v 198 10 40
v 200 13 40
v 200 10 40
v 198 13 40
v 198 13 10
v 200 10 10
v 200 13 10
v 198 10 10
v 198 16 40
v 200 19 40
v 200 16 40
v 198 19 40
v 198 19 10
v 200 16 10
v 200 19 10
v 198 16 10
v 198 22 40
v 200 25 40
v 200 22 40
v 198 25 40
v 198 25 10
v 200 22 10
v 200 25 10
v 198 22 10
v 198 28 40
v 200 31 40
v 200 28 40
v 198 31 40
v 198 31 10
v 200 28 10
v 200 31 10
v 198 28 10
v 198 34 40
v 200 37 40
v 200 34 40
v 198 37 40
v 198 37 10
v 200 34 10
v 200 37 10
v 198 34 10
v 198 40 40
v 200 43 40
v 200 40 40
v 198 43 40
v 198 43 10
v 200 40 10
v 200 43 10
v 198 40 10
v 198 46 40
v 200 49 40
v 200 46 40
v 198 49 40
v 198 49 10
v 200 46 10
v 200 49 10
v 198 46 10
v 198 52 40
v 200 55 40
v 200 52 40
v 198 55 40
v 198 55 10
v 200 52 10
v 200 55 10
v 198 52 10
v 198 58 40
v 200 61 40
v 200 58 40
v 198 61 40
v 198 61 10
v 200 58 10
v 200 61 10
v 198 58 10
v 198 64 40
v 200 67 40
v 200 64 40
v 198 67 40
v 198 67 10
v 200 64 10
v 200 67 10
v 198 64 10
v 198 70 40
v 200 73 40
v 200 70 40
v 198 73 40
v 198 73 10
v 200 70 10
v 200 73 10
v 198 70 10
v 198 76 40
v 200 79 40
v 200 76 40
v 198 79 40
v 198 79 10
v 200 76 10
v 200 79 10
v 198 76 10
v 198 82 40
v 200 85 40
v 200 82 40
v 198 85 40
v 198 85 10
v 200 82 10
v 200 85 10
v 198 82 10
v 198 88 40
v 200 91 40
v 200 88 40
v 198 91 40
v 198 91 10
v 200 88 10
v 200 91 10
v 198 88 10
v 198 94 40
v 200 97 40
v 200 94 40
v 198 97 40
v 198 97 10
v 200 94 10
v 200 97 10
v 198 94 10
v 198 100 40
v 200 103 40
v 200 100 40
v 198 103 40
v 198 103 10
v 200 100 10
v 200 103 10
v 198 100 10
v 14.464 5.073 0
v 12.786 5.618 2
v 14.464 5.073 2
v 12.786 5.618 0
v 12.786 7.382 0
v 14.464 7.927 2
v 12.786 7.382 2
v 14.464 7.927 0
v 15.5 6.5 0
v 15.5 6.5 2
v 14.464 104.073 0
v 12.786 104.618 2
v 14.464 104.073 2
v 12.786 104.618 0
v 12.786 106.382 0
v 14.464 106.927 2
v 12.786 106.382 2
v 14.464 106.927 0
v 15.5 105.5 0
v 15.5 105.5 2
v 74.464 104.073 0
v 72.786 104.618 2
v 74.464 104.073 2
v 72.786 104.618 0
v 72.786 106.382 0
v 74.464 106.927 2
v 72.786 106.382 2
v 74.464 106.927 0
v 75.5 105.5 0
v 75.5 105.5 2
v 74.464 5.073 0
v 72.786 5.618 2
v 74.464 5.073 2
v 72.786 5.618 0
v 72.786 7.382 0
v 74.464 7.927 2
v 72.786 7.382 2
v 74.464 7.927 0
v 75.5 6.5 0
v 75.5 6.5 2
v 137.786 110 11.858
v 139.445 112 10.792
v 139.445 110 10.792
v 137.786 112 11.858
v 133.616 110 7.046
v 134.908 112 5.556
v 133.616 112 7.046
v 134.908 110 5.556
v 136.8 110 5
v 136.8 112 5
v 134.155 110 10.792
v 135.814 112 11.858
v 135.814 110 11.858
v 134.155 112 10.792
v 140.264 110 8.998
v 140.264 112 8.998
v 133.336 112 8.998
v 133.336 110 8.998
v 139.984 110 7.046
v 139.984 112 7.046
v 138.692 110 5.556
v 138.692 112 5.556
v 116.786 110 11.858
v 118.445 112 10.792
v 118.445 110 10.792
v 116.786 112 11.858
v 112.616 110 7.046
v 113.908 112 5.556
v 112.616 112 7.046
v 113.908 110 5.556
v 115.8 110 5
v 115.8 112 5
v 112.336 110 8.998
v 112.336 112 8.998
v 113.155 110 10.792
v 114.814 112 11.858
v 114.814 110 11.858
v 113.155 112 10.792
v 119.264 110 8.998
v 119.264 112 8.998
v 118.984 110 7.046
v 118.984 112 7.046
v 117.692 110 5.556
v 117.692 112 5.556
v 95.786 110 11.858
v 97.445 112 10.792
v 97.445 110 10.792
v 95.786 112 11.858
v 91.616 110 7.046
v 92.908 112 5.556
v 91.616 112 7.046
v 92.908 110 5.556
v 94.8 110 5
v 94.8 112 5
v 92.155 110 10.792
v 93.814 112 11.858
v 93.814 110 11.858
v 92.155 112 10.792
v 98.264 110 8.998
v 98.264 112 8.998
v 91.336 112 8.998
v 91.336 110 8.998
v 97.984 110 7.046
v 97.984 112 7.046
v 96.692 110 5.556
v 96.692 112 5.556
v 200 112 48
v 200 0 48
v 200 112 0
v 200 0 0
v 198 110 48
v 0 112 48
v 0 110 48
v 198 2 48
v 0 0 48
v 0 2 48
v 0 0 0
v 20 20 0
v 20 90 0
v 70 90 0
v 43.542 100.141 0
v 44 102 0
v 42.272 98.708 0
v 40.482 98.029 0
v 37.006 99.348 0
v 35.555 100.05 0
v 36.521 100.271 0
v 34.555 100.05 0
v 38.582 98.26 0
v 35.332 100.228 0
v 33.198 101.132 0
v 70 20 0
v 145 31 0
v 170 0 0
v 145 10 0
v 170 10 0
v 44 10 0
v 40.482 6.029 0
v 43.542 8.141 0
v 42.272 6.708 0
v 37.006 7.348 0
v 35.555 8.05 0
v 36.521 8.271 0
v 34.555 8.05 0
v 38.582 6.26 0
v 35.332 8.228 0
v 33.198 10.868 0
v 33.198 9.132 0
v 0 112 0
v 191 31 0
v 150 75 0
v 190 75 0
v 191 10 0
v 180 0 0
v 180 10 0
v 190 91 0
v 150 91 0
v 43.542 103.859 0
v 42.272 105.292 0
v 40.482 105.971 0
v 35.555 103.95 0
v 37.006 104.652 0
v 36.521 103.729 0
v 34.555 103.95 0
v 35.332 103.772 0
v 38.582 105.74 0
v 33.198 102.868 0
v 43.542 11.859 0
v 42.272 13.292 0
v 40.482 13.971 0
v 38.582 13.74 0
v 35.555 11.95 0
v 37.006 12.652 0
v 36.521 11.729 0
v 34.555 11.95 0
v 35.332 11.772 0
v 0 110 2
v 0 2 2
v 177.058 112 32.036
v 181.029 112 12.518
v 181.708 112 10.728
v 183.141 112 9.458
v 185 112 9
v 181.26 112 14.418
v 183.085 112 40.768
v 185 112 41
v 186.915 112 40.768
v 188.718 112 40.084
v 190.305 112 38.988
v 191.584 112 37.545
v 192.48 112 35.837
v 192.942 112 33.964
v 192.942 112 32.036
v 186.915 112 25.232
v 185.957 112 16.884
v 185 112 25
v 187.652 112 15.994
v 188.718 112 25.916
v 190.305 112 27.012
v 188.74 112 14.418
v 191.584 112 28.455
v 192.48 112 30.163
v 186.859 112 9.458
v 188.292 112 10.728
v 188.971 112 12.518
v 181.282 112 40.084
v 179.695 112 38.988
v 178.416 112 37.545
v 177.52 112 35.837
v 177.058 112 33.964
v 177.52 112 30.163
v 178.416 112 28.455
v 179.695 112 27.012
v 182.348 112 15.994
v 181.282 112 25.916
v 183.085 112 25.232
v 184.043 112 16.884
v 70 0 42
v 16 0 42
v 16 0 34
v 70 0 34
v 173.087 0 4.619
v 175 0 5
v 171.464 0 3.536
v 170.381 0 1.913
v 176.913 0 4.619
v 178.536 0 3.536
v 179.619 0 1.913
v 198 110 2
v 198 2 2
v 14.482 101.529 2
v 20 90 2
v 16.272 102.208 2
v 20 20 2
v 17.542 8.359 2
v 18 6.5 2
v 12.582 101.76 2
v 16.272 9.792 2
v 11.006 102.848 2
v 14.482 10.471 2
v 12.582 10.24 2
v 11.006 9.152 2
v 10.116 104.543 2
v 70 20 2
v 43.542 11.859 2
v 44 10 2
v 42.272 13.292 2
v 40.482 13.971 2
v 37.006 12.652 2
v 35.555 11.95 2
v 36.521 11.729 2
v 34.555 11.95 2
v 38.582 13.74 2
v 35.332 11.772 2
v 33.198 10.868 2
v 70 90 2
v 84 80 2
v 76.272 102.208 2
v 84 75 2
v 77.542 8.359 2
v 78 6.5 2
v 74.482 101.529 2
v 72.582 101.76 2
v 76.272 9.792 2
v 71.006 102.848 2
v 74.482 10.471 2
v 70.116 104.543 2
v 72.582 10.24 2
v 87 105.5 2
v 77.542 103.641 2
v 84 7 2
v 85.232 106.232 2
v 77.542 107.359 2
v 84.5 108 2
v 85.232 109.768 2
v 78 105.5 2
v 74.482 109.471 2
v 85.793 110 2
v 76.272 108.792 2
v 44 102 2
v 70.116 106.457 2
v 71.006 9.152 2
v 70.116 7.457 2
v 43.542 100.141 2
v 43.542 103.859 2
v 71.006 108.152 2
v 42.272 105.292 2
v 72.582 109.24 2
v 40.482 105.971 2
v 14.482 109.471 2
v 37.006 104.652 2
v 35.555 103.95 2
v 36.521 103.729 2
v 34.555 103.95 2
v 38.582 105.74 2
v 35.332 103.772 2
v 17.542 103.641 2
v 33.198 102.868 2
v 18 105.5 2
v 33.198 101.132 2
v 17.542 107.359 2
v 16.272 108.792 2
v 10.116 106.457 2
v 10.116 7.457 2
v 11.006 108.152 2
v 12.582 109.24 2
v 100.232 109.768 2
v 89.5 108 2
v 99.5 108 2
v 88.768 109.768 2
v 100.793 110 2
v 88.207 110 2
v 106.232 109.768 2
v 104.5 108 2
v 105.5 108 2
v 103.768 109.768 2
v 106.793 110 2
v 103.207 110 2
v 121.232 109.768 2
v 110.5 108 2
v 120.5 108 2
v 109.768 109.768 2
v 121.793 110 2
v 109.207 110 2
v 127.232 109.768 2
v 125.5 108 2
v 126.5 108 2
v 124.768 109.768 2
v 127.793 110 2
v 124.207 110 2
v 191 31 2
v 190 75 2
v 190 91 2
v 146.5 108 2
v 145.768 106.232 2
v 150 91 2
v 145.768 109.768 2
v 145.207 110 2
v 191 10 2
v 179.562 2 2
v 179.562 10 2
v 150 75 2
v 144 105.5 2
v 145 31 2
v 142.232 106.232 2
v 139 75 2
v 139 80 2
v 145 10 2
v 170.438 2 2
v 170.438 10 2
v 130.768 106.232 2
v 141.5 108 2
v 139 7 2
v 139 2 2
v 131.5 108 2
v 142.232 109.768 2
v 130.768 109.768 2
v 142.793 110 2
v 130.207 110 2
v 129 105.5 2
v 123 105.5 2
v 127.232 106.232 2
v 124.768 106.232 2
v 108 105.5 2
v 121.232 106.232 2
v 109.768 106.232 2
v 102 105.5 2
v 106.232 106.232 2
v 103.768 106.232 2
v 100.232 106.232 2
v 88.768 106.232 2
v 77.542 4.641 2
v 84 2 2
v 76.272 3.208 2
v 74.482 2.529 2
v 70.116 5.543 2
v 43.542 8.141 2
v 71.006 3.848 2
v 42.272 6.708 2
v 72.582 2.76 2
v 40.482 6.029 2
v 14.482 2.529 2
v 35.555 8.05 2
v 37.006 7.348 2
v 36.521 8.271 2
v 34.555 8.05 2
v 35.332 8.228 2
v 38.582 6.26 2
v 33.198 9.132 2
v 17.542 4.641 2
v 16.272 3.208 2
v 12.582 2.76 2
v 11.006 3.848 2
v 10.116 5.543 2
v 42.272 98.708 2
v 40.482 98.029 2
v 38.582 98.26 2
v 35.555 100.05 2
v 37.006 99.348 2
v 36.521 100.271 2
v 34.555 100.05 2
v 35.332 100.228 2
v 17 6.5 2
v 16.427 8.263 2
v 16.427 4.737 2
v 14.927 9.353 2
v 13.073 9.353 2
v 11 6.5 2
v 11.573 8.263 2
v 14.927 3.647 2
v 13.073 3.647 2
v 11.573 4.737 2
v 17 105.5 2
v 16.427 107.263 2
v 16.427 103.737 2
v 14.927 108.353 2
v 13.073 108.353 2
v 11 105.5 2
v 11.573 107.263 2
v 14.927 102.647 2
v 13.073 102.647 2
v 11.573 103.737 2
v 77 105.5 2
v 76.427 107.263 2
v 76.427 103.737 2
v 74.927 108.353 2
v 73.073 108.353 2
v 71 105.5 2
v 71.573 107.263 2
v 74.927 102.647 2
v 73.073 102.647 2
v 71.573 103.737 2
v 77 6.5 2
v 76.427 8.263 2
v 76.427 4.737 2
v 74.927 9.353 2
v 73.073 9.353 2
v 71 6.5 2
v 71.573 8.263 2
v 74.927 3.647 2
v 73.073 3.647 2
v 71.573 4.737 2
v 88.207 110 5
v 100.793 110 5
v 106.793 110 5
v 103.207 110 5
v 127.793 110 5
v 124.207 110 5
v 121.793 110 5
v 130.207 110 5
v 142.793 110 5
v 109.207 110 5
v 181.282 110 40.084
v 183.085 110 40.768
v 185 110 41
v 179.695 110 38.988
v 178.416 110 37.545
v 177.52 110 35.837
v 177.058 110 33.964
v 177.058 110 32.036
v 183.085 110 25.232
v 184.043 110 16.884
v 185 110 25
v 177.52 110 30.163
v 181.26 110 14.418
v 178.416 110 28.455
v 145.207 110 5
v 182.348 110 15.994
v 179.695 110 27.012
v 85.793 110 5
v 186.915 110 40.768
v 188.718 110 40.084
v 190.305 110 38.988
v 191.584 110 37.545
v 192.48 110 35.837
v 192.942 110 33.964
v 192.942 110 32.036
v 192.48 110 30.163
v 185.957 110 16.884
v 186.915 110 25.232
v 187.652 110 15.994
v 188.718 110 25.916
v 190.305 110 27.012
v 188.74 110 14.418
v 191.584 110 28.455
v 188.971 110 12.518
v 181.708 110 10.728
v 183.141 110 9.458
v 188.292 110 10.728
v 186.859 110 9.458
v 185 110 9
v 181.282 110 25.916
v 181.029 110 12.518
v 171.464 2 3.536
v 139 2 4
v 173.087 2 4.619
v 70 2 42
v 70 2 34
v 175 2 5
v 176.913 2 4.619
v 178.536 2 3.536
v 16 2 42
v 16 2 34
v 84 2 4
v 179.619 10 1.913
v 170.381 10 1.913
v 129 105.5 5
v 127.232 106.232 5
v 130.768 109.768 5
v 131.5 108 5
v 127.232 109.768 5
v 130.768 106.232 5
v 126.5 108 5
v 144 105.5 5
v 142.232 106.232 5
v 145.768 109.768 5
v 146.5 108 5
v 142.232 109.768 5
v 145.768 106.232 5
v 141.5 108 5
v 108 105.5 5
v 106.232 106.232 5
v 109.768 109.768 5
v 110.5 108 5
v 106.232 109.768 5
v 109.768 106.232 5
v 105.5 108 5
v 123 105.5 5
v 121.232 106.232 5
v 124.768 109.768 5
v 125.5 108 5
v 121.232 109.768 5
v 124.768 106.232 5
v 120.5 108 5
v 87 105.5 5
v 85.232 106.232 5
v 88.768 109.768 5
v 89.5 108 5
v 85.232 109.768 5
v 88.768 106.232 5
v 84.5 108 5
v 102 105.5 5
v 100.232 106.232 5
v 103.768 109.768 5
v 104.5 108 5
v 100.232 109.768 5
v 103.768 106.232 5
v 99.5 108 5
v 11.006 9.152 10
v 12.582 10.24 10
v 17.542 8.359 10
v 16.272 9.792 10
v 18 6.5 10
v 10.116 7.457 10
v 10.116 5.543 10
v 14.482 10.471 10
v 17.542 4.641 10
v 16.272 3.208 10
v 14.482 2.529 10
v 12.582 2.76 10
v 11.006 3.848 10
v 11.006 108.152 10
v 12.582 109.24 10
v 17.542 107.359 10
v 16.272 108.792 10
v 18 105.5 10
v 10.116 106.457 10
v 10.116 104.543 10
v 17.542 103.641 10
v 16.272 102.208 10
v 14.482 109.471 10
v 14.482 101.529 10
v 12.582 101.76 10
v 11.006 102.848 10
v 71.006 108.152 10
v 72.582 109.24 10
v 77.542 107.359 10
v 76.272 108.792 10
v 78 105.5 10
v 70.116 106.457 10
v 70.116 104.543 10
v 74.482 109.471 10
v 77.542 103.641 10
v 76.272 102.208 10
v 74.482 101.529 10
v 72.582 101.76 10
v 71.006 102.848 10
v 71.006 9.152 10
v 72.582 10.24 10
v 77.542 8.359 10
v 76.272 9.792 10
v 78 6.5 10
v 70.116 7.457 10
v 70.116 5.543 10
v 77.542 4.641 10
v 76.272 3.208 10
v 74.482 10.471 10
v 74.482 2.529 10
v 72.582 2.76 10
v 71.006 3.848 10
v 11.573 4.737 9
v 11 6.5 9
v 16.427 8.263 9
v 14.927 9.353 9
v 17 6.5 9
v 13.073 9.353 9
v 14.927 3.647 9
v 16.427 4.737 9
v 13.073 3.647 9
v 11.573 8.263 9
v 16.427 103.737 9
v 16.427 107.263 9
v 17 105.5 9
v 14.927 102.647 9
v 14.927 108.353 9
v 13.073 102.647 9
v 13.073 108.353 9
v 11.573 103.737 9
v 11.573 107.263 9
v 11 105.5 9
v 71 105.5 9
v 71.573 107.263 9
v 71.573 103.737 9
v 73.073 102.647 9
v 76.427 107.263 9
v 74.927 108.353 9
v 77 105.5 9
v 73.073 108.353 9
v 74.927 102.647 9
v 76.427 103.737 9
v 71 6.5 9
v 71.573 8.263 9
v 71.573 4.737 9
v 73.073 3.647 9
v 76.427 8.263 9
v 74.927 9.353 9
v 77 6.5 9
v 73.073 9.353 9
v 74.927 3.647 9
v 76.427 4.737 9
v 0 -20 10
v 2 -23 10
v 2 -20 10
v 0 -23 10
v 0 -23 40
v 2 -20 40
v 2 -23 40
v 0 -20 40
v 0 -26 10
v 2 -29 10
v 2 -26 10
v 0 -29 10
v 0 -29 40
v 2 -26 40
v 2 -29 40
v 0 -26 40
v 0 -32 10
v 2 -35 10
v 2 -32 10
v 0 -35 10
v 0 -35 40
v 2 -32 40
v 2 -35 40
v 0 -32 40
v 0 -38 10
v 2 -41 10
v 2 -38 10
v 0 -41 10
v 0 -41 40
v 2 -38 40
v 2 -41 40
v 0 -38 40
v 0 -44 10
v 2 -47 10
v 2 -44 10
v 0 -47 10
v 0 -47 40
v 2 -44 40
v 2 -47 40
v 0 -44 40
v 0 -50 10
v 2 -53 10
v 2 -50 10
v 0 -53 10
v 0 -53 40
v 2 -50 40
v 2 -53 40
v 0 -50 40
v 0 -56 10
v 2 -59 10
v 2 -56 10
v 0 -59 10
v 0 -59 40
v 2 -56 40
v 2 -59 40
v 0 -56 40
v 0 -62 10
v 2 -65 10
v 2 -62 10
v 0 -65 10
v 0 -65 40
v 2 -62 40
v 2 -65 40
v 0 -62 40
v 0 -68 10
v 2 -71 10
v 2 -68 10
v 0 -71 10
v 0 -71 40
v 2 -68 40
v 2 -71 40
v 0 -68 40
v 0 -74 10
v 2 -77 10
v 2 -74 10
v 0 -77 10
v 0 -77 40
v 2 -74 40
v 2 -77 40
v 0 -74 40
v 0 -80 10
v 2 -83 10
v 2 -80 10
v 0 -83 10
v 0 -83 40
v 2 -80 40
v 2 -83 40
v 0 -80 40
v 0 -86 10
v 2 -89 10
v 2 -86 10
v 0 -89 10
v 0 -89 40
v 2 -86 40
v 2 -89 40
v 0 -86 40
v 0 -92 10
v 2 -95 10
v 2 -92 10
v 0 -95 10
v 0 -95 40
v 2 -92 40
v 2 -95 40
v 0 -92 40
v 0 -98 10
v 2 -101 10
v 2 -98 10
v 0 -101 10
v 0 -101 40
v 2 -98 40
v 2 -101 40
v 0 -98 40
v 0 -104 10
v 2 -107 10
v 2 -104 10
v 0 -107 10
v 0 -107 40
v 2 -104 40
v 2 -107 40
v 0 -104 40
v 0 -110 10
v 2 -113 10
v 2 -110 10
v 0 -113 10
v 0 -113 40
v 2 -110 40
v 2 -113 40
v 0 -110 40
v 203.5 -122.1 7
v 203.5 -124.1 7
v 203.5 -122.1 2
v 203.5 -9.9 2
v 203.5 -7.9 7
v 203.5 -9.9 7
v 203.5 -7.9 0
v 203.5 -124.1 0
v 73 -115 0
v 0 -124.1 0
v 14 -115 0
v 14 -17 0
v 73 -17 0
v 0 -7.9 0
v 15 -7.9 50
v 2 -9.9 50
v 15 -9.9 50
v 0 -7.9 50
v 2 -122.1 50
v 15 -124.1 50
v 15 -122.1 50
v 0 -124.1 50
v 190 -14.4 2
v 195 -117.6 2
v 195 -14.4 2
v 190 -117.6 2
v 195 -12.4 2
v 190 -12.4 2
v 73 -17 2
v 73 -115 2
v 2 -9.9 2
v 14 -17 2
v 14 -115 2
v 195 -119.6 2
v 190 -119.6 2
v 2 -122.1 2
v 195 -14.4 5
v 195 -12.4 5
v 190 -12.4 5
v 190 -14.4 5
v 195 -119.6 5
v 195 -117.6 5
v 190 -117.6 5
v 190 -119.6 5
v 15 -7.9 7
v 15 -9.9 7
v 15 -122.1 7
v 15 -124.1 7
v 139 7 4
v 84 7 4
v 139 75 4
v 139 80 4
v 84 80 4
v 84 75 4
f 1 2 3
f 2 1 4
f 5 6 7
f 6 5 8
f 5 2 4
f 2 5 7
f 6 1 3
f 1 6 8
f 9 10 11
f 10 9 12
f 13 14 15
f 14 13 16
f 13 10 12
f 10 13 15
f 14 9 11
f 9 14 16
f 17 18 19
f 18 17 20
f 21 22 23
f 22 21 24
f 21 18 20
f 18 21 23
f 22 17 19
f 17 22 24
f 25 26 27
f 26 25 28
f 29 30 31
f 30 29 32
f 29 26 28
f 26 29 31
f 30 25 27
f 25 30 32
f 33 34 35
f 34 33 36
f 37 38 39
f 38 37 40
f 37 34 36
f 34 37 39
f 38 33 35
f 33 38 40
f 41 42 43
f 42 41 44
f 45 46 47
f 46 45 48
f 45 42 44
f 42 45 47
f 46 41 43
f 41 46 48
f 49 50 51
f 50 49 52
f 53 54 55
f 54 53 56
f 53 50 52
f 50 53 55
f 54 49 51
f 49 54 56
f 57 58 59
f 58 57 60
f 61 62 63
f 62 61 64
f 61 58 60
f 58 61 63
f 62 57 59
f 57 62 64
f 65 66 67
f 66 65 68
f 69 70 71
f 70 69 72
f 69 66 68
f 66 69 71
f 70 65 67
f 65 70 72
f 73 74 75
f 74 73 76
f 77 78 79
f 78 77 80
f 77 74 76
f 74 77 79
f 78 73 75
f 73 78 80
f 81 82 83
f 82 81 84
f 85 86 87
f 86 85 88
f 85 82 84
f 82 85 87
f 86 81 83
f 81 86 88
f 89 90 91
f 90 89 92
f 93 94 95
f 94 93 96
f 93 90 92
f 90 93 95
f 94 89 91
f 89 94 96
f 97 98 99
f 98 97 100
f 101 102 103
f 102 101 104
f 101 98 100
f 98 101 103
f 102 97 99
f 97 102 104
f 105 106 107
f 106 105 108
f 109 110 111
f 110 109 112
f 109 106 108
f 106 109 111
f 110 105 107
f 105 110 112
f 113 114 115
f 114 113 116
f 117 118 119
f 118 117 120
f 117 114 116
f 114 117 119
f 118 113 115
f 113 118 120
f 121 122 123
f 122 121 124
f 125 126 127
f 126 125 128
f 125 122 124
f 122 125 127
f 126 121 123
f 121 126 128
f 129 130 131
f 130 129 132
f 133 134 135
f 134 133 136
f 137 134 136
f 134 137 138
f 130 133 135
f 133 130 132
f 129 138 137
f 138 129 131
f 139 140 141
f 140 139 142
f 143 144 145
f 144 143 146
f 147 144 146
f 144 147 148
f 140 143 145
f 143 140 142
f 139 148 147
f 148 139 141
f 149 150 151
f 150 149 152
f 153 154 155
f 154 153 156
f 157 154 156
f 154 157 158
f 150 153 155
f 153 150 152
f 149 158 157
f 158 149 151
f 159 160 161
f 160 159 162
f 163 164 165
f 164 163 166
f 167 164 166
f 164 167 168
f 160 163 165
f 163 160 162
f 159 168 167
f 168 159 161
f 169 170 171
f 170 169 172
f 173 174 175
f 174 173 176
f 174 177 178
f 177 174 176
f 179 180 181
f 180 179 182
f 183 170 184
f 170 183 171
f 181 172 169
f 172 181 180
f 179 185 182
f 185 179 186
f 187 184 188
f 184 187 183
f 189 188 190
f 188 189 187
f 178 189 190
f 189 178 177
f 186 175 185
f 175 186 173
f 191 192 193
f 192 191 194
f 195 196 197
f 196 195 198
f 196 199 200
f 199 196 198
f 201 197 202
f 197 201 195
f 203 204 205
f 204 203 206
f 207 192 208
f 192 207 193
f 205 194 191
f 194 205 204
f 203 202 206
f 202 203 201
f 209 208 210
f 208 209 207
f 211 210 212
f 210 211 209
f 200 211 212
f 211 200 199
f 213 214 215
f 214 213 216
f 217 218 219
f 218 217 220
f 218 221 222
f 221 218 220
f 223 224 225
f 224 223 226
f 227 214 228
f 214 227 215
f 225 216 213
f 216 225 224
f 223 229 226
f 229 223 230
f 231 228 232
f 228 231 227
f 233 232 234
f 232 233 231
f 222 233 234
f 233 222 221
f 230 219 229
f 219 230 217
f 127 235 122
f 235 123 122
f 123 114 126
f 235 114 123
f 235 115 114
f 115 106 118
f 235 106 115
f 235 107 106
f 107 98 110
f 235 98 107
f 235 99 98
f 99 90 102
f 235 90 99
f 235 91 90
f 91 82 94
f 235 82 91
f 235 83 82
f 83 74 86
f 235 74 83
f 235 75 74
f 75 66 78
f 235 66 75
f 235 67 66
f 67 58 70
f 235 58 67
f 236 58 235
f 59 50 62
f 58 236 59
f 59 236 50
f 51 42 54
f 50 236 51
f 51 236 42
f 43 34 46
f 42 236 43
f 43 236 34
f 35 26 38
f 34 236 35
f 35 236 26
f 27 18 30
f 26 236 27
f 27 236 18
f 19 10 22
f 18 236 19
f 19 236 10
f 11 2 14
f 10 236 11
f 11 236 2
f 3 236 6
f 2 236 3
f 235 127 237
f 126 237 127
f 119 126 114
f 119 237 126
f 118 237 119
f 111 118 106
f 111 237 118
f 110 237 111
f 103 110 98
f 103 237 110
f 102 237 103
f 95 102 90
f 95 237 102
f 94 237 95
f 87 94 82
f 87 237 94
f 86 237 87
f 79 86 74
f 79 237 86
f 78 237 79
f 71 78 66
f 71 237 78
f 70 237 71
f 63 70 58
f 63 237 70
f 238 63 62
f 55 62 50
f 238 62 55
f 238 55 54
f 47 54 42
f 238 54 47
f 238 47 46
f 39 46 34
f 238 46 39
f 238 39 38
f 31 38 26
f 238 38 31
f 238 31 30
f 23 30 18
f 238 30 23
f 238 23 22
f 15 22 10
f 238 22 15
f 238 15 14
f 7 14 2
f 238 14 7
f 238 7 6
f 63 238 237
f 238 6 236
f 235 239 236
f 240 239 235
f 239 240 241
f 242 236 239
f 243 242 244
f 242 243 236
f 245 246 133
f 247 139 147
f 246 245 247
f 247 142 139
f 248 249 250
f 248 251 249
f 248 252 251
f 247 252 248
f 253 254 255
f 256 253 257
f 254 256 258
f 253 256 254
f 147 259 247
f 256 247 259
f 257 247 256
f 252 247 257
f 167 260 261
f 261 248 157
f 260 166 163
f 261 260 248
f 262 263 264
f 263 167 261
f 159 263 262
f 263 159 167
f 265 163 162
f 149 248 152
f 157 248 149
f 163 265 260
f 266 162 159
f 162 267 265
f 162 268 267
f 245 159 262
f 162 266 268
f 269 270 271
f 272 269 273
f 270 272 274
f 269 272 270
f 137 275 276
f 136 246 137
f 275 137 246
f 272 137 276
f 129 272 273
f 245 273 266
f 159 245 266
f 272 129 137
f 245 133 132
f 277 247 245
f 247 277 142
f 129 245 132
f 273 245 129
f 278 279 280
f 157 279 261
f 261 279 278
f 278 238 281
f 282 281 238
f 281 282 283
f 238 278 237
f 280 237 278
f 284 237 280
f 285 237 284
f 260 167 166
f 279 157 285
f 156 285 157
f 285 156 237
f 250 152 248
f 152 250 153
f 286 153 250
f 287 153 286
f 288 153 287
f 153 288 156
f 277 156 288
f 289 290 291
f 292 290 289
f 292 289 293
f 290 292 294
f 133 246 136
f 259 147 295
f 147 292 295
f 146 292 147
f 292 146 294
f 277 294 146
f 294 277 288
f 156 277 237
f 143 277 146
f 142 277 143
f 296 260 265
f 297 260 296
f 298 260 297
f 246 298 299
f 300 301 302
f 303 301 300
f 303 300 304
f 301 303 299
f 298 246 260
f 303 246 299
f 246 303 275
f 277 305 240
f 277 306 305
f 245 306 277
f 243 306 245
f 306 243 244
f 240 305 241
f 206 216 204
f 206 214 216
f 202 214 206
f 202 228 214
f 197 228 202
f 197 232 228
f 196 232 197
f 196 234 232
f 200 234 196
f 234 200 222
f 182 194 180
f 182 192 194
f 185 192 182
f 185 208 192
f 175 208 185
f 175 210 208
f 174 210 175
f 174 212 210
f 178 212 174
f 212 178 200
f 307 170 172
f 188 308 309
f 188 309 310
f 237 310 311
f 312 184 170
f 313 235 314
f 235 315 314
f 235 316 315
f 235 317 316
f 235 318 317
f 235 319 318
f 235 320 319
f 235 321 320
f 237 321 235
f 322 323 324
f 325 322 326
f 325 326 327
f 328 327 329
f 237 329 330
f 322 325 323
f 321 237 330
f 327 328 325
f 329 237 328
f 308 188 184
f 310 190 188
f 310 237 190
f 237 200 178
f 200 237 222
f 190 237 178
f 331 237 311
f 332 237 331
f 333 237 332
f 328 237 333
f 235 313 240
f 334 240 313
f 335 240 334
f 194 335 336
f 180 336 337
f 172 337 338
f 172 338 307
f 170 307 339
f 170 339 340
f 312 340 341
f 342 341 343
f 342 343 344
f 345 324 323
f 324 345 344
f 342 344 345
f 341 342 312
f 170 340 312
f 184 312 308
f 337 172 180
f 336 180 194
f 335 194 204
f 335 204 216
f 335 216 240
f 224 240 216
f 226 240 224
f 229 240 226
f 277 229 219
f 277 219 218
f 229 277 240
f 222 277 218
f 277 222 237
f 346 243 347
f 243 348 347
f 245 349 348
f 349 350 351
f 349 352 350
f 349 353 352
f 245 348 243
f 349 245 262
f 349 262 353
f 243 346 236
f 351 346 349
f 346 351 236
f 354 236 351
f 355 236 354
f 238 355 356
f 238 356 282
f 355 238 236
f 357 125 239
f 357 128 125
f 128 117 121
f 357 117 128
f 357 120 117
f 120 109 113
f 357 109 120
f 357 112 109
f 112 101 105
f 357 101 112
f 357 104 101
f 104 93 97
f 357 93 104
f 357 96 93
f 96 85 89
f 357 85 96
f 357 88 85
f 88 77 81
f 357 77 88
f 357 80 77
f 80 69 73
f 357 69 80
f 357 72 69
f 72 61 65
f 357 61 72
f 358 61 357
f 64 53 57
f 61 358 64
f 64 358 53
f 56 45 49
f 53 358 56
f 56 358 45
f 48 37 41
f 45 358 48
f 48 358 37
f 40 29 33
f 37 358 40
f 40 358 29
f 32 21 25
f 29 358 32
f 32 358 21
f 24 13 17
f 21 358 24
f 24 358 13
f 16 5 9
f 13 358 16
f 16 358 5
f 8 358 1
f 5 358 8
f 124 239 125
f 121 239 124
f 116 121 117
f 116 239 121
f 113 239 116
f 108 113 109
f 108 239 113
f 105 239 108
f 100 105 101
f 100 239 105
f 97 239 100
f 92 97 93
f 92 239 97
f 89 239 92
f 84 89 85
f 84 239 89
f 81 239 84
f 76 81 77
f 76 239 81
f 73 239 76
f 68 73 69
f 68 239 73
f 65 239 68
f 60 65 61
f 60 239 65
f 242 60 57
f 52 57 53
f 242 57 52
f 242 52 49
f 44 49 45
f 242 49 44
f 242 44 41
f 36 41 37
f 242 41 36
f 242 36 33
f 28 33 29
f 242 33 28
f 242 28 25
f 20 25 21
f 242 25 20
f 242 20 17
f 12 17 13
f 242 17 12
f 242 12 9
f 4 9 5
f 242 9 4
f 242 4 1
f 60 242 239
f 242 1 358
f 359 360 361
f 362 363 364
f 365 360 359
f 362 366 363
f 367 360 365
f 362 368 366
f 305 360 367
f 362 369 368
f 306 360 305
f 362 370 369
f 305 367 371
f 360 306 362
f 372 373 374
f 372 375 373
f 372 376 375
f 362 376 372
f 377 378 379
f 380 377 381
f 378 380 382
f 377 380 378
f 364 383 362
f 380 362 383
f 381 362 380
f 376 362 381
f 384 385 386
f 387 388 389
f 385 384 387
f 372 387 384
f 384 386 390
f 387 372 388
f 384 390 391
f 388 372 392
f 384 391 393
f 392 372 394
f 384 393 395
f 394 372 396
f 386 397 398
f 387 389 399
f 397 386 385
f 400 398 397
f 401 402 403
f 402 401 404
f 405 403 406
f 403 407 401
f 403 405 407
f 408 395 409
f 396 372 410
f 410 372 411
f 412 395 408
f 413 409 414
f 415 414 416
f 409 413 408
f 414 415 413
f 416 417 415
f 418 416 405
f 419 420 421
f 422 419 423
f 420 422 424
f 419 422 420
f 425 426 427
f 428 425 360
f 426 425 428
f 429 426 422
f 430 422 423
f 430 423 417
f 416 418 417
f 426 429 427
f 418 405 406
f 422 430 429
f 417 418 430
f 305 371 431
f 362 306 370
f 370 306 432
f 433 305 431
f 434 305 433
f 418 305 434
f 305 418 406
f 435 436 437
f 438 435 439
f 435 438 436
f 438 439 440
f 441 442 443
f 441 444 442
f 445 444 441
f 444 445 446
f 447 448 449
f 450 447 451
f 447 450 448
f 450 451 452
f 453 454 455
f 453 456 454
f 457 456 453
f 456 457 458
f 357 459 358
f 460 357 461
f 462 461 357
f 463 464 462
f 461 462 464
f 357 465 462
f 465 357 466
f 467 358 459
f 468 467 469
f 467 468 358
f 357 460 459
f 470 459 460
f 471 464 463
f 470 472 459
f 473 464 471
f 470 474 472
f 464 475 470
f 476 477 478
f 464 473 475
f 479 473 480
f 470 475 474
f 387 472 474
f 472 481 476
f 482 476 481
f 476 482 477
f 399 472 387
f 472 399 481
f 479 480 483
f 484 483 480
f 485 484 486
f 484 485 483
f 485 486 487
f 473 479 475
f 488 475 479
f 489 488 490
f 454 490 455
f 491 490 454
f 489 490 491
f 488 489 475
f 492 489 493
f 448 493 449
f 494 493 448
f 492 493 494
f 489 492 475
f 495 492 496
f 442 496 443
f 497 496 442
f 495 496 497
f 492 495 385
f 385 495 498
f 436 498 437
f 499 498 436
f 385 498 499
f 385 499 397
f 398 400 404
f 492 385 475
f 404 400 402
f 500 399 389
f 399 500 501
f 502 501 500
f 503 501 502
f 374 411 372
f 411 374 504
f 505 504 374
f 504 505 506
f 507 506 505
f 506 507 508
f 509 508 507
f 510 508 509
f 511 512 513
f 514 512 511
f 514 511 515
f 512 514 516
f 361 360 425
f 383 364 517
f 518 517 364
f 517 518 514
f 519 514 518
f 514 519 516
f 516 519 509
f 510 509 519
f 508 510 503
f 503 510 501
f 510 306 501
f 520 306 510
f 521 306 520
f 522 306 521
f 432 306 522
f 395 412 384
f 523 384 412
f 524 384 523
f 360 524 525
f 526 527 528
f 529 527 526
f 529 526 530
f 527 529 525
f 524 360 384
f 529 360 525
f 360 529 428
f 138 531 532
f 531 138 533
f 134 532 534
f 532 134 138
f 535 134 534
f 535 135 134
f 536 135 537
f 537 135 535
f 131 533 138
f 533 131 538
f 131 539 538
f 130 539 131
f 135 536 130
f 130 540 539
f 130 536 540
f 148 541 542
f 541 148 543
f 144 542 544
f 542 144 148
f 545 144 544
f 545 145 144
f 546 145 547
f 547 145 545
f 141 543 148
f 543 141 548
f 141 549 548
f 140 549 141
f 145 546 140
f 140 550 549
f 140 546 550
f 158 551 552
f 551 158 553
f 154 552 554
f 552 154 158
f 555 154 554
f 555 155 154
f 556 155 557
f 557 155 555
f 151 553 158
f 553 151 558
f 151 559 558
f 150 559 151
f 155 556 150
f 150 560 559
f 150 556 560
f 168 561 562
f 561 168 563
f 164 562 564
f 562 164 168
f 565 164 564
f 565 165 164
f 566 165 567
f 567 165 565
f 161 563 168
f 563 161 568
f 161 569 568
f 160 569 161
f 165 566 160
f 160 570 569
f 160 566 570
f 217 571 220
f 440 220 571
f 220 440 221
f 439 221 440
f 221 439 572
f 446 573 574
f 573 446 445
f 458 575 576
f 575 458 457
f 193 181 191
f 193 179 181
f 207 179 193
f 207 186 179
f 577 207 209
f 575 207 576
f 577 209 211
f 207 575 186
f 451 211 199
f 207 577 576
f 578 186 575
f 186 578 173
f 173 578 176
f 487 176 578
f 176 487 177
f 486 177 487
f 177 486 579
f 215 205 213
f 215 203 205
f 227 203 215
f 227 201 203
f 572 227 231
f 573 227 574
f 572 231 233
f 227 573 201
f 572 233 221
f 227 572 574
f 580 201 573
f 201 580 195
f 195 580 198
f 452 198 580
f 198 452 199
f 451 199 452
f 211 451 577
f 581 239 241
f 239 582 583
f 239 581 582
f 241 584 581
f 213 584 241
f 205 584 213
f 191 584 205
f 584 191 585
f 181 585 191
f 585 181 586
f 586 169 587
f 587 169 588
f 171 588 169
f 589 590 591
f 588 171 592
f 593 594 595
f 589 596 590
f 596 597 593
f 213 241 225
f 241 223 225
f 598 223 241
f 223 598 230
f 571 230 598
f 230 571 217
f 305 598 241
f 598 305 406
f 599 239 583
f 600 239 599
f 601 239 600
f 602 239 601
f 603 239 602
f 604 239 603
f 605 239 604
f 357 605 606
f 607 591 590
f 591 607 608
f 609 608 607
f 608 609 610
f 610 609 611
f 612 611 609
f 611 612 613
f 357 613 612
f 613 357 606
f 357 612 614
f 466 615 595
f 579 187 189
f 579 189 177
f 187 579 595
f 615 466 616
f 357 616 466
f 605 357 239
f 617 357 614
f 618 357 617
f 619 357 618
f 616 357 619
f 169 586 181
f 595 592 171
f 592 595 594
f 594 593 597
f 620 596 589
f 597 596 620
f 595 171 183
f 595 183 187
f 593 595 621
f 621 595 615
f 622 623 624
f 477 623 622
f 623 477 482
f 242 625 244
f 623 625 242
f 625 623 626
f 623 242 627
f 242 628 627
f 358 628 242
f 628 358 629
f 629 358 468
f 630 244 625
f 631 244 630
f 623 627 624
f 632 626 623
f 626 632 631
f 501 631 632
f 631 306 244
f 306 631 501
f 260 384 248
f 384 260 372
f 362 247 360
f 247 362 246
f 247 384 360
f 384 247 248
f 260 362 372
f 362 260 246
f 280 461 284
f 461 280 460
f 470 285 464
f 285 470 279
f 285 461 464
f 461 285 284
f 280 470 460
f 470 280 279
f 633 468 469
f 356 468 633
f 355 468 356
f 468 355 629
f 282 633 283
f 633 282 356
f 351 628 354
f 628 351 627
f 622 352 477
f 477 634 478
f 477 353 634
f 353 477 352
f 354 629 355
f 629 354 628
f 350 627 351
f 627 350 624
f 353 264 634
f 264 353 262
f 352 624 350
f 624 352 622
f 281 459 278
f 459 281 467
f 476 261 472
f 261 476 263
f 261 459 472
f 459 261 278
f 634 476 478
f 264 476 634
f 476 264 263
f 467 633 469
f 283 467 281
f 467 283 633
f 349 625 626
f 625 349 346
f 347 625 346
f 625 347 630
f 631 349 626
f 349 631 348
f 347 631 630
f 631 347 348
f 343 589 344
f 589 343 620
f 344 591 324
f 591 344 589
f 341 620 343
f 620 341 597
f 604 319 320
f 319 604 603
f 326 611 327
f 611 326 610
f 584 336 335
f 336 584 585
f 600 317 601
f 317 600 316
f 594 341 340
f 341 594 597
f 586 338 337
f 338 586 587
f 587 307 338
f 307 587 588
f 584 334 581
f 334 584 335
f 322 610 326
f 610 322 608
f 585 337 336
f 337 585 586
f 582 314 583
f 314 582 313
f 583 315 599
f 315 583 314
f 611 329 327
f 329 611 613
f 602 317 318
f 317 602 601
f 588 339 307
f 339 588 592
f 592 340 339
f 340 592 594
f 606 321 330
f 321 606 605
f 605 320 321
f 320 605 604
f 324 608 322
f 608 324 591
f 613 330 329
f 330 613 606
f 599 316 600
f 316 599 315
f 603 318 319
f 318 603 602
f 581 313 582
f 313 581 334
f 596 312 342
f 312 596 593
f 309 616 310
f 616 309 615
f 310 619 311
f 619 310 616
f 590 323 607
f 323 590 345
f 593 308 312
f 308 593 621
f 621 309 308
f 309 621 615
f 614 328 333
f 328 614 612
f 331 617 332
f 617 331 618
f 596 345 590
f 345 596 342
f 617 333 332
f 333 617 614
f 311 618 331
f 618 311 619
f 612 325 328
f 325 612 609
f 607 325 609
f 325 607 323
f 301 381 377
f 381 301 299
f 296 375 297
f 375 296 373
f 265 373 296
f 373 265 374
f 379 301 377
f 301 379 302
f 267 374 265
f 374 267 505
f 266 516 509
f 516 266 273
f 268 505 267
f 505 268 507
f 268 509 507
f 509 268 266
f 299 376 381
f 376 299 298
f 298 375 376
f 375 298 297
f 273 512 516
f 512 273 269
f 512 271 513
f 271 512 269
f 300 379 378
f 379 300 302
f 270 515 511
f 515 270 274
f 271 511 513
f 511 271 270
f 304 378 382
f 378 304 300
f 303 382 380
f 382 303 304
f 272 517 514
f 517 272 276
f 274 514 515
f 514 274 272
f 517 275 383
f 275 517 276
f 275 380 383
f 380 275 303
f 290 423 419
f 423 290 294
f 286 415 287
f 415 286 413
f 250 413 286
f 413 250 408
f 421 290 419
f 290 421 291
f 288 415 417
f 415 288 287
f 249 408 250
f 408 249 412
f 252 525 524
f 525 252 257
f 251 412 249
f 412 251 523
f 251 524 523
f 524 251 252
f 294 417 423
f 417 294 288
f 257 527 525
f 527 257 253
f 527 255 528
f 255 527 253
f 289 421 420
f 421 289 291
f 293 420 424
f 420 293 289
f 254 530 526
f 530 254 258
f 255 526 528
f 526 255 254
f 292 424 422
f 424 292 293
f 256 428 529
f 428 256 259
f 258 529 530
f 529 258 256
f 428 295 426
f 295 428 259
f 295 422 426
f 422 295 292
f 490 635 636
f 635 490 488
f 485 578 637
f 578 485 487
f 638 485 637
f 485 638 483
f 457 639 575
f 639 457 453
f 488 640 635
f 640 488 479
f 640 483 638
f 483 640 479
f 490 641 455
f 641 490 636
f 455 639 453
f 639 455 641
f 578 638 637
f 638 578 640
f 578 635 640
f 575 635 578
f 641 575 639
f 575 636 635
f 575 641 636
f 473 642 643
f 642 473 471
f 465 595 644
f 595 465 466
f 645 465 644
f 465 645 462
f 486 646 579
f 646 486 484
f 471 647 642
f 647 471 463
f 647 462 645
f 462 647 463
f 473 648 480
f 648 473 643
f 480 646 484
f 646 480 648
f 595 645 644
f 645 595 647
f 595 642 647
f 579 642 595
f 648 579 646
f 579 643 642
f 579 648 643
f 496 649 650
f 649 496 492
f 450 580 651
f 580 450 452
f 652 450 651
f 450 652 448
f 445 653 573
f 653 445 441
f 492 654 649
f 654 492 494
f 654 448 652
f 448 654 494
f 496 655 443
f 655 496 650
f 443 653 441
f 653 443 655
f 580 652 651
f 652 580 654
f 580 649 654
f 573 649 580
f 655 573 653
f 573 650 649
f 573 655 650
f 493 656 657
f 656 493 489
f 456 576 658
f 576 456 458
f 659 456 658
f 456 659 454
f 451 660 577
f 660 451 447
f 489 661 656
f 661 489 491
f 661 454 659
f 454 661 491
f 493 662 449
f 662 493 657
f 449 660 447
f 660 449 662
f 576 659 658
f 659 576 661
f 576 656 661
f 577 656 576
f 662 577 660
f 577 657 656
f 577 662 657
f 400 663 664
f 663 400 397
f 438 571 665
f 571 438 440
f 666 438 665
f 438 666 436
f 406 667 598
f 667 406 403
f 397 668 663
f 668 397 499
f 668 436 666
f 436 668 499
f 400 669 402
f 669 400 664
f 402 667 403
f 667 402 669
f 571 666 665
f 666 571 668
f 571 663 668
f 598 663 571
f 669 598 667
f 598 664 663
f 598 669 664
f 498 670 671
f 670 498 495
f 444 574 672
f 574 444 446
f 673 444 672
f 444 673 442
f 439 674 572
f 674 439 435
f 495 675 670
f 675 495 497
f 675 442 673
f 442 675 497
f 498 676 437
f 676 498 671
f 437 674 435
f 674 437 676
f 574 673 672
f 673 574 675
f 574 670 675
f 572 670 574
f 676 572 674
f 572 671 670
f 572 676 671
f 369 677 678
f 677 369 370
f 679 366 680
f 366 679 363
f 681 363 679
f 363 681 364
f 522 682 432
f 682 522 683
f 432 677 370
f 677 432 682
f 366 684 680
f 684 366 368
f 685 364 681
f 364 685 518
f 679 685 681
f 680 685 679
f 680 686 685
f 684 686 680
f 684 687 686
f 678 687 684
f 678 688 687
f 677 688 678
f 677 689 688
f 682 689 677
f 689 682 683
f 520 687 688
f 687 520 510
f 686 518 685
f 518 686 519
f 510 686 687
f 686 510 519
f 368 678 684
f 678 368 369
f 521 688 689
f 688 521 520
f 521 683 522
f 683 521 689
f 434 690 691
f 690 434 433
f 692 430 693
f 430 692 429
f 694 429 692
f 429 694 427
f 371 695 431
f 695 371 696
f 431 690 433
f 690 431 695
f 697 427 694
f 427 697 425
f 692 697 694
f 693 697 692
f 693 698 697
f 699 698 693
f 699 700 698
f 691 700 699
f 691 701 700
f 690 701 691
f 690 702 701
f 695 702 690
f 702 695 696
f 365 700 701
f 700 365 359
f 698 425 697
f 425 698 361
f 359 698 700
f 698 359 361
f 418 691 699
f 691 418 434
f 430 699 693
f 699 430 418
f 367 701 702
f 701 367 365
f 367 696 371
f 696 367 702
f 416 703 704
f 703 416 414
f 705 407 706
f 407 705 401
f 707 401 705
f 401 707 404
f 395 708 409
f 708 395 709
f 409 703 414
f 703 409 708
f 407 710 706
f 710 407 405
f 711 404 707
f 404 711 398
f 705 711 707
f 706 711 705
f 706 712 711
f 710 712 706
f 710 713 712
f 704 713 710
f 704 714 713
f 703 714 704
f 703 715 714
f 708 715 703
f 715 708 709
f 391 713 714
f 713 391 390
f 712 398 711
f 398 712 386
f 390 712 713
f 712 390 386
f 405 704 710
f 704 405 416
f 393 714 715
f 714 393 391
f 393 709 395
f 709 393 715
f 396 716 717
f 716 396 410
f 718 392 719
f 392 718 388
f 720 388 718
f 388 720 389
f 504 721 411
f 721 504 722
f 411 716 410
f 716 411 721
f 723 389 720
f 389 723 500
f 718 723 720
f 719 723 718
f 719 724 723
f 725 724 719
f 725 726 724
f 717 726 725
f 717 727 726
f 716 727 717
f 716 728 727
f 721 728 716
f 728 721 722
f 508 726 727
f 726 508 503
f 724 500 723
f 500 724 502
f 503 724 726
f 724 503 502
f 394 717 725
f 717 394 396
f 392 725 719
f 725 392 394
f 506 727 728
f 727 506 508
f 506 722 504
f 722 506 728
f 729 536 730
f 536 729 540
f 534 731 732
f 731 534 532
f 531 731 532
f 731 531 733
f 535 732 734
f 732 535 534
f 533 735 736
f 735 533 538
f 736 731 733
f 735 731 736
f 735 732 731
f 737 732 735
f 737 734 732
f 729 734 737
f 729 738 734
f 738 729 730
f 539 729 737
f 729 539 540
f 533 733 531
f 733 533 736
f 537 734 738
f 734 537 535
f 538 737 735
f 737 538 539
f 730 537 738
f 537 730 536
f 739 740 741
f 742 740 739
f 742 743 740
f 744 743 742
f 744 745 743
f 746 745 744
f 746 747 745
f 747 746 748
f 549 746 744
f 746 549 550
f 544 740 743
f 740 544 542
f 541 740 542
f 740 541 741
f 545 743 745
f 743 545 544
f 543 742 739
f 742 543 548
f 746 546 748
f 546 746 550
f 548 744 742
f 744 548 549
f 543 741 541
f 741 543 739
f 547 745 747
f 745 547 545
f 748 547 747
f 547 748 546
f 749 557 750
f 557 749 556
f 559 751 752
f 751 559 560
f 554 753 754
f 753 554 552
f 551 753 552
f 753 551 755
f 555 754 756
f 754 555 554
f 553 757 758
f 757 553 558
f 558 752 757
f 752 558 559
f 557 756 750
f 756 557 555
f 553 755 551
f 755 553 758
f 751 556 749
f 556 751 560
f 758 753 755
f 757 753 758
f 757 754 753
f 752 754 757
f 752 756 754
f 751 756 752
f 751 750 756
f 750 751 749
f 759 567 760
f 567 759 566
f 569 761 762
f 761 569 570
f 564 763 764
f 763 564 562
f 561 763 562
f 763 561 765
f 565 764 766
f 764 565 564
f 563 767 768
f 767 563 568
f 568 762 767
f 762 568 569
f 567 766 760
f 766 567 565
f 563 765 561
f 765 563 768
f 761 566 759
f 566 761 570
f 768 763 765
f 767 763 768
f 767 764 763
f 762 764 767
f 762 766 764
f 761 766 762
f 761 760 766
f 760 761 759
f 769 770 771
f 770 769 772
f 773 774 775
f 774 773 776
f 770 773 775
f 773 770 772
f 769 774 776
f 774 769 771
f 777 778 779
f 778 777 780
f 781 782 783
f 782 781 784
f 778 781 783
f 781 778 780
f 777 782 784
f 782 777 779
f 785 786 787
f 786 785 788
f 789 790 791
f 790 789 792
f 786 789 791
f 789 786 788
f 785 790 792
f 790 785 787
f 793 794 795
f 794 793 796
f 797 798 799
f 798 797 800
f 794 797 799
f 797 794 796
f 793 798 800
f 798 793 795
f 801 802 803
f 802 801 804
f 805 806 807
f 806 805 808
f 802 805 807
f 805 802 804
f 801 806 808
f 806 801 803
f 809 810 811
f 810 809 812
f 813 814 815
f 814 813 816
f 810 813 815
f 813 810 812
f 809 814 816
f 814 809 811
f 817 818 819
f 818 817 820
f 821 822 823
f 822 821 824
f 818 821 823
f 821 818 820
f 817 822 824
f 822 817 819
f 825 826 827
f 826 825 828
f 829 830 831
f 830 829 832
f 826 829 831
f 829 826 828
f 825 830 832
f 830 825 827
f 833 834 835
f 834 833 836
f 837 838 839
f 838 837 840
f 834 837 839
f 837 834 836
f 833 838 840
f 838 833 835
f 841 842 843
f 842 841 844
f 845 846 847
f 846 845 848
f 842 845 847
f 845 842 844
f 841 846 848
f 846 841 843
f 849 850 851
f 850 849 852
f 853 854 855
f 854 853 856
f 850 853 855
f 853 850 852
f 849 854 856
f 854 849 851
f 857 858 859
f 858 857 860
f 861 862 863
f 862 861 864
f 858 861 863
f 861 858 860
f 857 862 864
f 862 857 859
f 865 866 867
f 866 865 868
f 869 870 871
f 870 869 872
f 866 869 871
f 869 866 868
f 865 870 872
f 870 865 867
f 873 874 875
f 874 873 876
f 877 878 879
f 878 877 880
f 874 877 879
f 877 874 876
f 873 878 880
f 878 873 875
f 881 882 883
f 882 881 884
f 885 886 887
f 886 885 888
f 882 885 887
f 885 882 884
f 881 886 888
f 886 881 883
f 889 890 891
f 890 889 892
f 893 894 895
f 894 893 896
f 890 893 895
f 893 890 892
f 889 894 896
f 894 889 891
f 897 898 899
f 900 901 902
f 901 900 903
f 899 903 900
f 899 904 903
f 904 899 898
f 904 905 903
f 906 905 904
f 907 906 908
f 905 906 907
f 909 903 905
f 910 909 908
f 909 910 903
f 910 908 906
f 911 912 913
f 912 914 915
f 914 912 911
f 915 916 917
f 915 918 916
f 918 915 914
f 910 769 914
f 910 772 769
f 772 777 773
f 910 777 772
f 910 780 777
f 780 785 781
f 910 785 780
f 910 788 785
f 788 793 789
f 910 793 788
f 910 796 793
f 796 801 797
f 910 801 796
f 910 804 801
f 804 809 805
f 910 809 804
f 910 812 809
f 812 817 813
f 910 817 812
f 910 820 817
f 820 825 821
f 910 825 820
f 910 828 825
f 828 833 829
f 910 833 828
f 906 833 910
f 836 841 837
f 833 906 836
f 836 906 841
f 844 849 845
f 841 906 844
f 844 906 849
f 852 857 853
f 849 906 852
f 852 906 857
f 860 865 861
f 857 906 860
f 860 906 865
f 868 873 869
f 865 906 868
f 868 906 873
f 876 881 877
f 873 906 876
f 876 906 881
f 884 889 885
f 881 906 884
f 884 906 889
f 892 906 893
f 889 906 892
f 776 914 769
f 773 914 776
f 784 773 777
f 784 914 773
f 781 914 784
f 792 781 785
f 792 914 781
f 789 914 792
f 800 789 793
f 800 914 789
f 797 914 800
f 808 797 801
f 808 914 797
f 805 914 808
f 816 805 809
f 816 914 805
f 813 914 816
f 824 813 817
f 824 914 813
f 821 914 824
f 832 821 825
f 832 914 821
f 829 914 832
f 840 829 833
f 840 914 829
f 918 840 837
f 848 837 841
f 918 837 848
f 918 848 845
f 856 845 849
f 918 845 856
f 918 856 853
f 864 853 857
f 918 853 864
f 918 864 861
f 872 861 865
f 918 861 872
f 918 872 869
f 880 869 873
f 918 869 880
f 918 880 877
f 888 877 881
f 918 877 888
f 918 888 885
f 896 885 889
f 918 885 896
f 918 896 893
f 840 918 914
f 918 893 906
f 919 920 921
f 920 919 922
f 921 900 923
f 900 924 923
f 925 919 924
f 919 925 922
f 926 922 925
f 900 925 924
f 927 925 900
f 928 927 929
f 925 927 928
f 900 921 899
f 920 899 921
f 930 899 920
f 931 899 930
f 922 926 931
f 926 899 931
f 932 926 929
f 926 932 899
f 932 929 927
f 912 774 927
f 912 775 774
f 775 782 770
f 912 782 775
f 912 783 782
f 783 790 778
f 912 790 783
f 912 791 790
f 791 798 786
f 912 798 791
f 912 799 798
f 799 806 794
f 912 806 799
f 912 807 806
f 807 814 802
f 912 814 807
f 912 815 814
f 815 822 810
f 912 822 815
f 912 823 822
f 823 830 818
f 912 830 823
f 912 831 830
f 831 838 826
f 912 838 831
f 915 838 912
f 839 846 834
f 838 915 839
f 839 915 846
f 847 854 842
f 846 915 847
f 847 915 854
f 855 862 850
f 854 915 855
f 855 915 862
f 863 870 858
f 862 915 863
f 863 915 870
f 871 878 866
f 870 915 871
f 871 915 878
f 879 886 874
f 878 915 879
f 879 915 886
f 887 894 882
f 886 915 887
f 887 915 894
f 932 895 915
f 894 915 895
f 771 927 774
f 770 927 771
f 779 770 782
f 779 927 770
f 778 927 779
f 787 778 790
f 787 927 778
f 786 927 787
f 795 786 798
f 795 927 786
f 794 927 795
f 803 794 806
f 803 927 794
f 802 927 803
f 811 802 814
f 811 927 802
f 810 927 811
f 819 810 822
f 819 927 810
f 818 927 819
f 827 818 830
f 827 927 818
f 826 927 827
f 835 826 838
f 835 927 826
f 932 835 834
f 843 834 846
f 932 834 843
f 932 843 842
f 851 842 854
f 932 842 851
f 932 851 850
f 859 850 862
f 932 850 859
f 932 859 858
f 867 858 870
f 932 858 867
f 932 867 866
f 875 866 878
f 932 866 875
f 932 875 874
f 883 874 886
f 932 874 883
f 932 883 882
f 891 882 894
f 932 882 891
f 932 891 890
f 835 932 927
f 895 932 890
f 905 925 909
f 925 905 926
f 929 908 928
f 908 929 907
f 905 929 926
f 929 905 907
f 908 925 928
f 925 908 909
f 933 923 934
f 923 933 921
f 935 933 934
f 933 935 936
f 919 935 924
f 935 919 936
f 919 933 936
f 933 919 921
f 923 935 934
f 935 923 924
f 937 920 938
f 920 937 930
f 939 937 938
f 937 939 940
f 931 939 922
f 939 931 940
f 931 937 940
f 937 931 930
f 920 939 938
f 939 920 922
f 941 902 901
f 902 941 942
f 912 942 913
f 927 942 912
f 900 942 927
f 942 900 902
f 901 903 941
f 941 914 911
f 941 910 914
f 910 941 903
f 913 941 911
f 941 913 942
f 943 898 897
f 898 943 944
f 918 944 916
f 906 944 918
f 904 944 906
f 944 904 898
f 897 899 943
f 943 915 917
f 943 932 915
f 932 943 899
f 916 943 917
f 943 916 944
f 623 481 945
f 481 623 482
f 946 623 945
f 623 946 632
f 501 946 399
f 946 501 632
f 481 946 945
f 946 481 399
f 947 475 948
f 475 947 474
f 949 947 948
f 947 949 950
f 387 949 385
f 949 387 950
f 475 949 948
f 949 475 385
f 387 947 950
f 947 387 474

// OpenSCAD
width = 112;
height = 200;
depth = 50;

wallThickness = 2;
maxWidth = 21; // MAX81355



difference() {
    cube([height, width, depth - wallThickness]);
        // general box
    translate([-1, wallThickness, wallThickness])
        cube([height - wallThickness + 1, width - (2 * wallThickness) , depth + 1]);
    
        // bottom hole
    translate([20, 20, -1])
        cube([50, 70, wallThickness * 2]);
    
    translate([height - 50, 75, -1])
        cube([40, 16, wallThickness * 2]);
    
        // cable hole
    translate([height - 25, 20 - 5, 0]) rotate([90, 0, 0])
        cylinder(h = height, r = 5);
    translate([height - 55, 10, -1])
        cube([46, 21, 15]);

        // cover ridge
    translate([2, 2, height - 2])
        cube([height - 4, width - 4, 5]);
    
        // side buttons hole
    translate([16, -1, depth - 16])
        cube([54, 10, 8]);
    
        // ventilation bottom
    margin = 10;
    for (i = [0 : ((width - 2*margin) / 6)]){
        translate([height - wallThickness - 1, margin + (i * 6), 10])
            cube([5, 3, depth - 20]);
    }    

    // hole for auto button
    translate([height - 15, 109 - 5, 33]) rotate([0, 90, 90])
        cylinder(h = height, r = 8);

    // hole for rotary button
    translate([height - 15, 109 - 5, 13]) rotate([0, 90, 90])
        cylinder(h = height, r = 4);

    // support screen
    translate([14, (width - 99) / 2, -1]) {
        translate([0, 0, 0])
            cylinder(10, r = 1.5);
        
        translate([0, 99, 0])
            cylinder(10, r = 1.5);

        translate([60, 99, 0])
            cylinder(10, r = 1.5);

        translate([60, 0, 0])
            cylinder(10, r = 1.5);
    }
    
    // holes for screws wall
    translate([40, 10, -1])
        cylinder(10, r = 4);
    translate([36, 10, -1])
        cylinder(10, r = 2);
    translate([35, 10, -1])
        cylinder(10, r = 2);

    translate([40, width - 10, -1])
        cylinder(10, r = 4);
    translate([36, width - 10, -1])
        cylinder(10, r = 2);
    translate([35, width - 10, -1])
        cylinder(10, r = 2);
    
    // holes for max's

    for (i = [1 : 3]) {
        translate([height - (maxWidth * i)  - 50 + 7.8, width - 4, 8.5]) rotate([0, 90, 90])
            cylinder(5, r = 3.5);
    }
}

    // support max's
for (i = [1 : 3]) {
    translate([height - (maxWidth * i)  - 50, width - 4, 0])
        cylinder(5, r = 2.5);

    translate([height - (maxWidth * i) + 15  - 50, width - 4, 0])
        cylinder(5, r = 2.5);
}

    // support dispatcher
translate([14 + 60 + 10, 0, 0])
    cube([55, wallThickness + 5, wallThickness + 2]);
translate([14 + 60 + 10, wallThickness + 78 - 5, 0])
    cube([55, 5, wallThickness + 2]);


    // support screen
difference() {
    translate([14, (width - 99) / 2, 0]) {
        translate([0, 0, 0])
            cylinder(10, r = 4);
        
        translate([0, 99, 0])
            cylinder(10, r = 4);

        translate([60, 99, 0])
            cylinder(10, r = 4);

        translate([60, 0, 0])
            cylinder(10, r = 4);
    }

    translate([14, (width - 99) / 2, -1]) {
        translate([0, 0, 0])
            cylinder(10, r = 3);
        
        translate([0, 99, 0])
            cylinder(10, r = 3);

        translate([60, 99, 0])
            cylinder(10, r = 3);

        translate([60, 0, 0])
            cylinder(10, r = 3);
    }
    
}

// cover
color("blue")
    //translate([0, width + 20, 0])
    //translate([-2.2, 0 , 0])
    rotate([180, 0, 0]) translate([0, 10, -depth]) {
    difference() {
        translate([0, -0.2, 0]) cube([height + wallThickness + 1.5, width + 0.4, depth]);
        translate([wallThickness, -1, -1])
            cube([height + 10, width + 2, depth - wallThickness + 1]);
        
        // screen hole
        screenHoleWidth = 98;
        translate([14, (width - screenHoleWidth - 2*wallThickness)/2 + wallThickness, depth - wallThickness - 1])
            cube([59, screenHoleWidth, wallThickness * 2]);
        
            // ventilation top
        margin = 10;
        for (i = [0 : ((width - 2*margin) / 6)]){
            translate([-1, margin + (i * 6), 10])
                cube([5, 3, depth - 20]);
        }
        
        
    }
    // pattes
    /*translate([0, wallThickness + 0.4, depth - 5])
        cube([5, wallThickness, 5]);

    translate([0, width - wallThickness - wallThickness - 0.4, depth - 5])
        cube([5, wallThickness, 5]);*/

    /*translate([0, wallThickness + 0.5, wallThickness + 0.5])
        cube([5, wallThickness, 5]);

    translate([0, width - wallThickness - wallThickness - 0.5, wallThickness + 0.5])
        cube([5, wallThickness, 5]);*/

    translate([height - 10, wallThickness + 0.4, depth - 5])
        cube([5, wallThickness, 5]);

    translate([height - 10, width - wallThickness - wallThickness - 0.4, depth - 5])
        cube([5, wallThickness, 5]);
    
    // border
    translate([0, -wallThickness - 0.1, depth - 7])
        cube([height + wallThickness + 1.5, wallThickness, 7]);

    translate([0, -wallThickness - 0.1, 0])
        cube([15, wallThickness, depth]);


    translate([0, width + 0.1, depth - 7])
        cube([height + wallThickness + 1.5, wallThickness, 7]);
    translate([0, width + 0.1, 0])
        cube([15, wallThickness, depth]);
    
}

// stuff DO NOT PRINT
color("red") {

}
